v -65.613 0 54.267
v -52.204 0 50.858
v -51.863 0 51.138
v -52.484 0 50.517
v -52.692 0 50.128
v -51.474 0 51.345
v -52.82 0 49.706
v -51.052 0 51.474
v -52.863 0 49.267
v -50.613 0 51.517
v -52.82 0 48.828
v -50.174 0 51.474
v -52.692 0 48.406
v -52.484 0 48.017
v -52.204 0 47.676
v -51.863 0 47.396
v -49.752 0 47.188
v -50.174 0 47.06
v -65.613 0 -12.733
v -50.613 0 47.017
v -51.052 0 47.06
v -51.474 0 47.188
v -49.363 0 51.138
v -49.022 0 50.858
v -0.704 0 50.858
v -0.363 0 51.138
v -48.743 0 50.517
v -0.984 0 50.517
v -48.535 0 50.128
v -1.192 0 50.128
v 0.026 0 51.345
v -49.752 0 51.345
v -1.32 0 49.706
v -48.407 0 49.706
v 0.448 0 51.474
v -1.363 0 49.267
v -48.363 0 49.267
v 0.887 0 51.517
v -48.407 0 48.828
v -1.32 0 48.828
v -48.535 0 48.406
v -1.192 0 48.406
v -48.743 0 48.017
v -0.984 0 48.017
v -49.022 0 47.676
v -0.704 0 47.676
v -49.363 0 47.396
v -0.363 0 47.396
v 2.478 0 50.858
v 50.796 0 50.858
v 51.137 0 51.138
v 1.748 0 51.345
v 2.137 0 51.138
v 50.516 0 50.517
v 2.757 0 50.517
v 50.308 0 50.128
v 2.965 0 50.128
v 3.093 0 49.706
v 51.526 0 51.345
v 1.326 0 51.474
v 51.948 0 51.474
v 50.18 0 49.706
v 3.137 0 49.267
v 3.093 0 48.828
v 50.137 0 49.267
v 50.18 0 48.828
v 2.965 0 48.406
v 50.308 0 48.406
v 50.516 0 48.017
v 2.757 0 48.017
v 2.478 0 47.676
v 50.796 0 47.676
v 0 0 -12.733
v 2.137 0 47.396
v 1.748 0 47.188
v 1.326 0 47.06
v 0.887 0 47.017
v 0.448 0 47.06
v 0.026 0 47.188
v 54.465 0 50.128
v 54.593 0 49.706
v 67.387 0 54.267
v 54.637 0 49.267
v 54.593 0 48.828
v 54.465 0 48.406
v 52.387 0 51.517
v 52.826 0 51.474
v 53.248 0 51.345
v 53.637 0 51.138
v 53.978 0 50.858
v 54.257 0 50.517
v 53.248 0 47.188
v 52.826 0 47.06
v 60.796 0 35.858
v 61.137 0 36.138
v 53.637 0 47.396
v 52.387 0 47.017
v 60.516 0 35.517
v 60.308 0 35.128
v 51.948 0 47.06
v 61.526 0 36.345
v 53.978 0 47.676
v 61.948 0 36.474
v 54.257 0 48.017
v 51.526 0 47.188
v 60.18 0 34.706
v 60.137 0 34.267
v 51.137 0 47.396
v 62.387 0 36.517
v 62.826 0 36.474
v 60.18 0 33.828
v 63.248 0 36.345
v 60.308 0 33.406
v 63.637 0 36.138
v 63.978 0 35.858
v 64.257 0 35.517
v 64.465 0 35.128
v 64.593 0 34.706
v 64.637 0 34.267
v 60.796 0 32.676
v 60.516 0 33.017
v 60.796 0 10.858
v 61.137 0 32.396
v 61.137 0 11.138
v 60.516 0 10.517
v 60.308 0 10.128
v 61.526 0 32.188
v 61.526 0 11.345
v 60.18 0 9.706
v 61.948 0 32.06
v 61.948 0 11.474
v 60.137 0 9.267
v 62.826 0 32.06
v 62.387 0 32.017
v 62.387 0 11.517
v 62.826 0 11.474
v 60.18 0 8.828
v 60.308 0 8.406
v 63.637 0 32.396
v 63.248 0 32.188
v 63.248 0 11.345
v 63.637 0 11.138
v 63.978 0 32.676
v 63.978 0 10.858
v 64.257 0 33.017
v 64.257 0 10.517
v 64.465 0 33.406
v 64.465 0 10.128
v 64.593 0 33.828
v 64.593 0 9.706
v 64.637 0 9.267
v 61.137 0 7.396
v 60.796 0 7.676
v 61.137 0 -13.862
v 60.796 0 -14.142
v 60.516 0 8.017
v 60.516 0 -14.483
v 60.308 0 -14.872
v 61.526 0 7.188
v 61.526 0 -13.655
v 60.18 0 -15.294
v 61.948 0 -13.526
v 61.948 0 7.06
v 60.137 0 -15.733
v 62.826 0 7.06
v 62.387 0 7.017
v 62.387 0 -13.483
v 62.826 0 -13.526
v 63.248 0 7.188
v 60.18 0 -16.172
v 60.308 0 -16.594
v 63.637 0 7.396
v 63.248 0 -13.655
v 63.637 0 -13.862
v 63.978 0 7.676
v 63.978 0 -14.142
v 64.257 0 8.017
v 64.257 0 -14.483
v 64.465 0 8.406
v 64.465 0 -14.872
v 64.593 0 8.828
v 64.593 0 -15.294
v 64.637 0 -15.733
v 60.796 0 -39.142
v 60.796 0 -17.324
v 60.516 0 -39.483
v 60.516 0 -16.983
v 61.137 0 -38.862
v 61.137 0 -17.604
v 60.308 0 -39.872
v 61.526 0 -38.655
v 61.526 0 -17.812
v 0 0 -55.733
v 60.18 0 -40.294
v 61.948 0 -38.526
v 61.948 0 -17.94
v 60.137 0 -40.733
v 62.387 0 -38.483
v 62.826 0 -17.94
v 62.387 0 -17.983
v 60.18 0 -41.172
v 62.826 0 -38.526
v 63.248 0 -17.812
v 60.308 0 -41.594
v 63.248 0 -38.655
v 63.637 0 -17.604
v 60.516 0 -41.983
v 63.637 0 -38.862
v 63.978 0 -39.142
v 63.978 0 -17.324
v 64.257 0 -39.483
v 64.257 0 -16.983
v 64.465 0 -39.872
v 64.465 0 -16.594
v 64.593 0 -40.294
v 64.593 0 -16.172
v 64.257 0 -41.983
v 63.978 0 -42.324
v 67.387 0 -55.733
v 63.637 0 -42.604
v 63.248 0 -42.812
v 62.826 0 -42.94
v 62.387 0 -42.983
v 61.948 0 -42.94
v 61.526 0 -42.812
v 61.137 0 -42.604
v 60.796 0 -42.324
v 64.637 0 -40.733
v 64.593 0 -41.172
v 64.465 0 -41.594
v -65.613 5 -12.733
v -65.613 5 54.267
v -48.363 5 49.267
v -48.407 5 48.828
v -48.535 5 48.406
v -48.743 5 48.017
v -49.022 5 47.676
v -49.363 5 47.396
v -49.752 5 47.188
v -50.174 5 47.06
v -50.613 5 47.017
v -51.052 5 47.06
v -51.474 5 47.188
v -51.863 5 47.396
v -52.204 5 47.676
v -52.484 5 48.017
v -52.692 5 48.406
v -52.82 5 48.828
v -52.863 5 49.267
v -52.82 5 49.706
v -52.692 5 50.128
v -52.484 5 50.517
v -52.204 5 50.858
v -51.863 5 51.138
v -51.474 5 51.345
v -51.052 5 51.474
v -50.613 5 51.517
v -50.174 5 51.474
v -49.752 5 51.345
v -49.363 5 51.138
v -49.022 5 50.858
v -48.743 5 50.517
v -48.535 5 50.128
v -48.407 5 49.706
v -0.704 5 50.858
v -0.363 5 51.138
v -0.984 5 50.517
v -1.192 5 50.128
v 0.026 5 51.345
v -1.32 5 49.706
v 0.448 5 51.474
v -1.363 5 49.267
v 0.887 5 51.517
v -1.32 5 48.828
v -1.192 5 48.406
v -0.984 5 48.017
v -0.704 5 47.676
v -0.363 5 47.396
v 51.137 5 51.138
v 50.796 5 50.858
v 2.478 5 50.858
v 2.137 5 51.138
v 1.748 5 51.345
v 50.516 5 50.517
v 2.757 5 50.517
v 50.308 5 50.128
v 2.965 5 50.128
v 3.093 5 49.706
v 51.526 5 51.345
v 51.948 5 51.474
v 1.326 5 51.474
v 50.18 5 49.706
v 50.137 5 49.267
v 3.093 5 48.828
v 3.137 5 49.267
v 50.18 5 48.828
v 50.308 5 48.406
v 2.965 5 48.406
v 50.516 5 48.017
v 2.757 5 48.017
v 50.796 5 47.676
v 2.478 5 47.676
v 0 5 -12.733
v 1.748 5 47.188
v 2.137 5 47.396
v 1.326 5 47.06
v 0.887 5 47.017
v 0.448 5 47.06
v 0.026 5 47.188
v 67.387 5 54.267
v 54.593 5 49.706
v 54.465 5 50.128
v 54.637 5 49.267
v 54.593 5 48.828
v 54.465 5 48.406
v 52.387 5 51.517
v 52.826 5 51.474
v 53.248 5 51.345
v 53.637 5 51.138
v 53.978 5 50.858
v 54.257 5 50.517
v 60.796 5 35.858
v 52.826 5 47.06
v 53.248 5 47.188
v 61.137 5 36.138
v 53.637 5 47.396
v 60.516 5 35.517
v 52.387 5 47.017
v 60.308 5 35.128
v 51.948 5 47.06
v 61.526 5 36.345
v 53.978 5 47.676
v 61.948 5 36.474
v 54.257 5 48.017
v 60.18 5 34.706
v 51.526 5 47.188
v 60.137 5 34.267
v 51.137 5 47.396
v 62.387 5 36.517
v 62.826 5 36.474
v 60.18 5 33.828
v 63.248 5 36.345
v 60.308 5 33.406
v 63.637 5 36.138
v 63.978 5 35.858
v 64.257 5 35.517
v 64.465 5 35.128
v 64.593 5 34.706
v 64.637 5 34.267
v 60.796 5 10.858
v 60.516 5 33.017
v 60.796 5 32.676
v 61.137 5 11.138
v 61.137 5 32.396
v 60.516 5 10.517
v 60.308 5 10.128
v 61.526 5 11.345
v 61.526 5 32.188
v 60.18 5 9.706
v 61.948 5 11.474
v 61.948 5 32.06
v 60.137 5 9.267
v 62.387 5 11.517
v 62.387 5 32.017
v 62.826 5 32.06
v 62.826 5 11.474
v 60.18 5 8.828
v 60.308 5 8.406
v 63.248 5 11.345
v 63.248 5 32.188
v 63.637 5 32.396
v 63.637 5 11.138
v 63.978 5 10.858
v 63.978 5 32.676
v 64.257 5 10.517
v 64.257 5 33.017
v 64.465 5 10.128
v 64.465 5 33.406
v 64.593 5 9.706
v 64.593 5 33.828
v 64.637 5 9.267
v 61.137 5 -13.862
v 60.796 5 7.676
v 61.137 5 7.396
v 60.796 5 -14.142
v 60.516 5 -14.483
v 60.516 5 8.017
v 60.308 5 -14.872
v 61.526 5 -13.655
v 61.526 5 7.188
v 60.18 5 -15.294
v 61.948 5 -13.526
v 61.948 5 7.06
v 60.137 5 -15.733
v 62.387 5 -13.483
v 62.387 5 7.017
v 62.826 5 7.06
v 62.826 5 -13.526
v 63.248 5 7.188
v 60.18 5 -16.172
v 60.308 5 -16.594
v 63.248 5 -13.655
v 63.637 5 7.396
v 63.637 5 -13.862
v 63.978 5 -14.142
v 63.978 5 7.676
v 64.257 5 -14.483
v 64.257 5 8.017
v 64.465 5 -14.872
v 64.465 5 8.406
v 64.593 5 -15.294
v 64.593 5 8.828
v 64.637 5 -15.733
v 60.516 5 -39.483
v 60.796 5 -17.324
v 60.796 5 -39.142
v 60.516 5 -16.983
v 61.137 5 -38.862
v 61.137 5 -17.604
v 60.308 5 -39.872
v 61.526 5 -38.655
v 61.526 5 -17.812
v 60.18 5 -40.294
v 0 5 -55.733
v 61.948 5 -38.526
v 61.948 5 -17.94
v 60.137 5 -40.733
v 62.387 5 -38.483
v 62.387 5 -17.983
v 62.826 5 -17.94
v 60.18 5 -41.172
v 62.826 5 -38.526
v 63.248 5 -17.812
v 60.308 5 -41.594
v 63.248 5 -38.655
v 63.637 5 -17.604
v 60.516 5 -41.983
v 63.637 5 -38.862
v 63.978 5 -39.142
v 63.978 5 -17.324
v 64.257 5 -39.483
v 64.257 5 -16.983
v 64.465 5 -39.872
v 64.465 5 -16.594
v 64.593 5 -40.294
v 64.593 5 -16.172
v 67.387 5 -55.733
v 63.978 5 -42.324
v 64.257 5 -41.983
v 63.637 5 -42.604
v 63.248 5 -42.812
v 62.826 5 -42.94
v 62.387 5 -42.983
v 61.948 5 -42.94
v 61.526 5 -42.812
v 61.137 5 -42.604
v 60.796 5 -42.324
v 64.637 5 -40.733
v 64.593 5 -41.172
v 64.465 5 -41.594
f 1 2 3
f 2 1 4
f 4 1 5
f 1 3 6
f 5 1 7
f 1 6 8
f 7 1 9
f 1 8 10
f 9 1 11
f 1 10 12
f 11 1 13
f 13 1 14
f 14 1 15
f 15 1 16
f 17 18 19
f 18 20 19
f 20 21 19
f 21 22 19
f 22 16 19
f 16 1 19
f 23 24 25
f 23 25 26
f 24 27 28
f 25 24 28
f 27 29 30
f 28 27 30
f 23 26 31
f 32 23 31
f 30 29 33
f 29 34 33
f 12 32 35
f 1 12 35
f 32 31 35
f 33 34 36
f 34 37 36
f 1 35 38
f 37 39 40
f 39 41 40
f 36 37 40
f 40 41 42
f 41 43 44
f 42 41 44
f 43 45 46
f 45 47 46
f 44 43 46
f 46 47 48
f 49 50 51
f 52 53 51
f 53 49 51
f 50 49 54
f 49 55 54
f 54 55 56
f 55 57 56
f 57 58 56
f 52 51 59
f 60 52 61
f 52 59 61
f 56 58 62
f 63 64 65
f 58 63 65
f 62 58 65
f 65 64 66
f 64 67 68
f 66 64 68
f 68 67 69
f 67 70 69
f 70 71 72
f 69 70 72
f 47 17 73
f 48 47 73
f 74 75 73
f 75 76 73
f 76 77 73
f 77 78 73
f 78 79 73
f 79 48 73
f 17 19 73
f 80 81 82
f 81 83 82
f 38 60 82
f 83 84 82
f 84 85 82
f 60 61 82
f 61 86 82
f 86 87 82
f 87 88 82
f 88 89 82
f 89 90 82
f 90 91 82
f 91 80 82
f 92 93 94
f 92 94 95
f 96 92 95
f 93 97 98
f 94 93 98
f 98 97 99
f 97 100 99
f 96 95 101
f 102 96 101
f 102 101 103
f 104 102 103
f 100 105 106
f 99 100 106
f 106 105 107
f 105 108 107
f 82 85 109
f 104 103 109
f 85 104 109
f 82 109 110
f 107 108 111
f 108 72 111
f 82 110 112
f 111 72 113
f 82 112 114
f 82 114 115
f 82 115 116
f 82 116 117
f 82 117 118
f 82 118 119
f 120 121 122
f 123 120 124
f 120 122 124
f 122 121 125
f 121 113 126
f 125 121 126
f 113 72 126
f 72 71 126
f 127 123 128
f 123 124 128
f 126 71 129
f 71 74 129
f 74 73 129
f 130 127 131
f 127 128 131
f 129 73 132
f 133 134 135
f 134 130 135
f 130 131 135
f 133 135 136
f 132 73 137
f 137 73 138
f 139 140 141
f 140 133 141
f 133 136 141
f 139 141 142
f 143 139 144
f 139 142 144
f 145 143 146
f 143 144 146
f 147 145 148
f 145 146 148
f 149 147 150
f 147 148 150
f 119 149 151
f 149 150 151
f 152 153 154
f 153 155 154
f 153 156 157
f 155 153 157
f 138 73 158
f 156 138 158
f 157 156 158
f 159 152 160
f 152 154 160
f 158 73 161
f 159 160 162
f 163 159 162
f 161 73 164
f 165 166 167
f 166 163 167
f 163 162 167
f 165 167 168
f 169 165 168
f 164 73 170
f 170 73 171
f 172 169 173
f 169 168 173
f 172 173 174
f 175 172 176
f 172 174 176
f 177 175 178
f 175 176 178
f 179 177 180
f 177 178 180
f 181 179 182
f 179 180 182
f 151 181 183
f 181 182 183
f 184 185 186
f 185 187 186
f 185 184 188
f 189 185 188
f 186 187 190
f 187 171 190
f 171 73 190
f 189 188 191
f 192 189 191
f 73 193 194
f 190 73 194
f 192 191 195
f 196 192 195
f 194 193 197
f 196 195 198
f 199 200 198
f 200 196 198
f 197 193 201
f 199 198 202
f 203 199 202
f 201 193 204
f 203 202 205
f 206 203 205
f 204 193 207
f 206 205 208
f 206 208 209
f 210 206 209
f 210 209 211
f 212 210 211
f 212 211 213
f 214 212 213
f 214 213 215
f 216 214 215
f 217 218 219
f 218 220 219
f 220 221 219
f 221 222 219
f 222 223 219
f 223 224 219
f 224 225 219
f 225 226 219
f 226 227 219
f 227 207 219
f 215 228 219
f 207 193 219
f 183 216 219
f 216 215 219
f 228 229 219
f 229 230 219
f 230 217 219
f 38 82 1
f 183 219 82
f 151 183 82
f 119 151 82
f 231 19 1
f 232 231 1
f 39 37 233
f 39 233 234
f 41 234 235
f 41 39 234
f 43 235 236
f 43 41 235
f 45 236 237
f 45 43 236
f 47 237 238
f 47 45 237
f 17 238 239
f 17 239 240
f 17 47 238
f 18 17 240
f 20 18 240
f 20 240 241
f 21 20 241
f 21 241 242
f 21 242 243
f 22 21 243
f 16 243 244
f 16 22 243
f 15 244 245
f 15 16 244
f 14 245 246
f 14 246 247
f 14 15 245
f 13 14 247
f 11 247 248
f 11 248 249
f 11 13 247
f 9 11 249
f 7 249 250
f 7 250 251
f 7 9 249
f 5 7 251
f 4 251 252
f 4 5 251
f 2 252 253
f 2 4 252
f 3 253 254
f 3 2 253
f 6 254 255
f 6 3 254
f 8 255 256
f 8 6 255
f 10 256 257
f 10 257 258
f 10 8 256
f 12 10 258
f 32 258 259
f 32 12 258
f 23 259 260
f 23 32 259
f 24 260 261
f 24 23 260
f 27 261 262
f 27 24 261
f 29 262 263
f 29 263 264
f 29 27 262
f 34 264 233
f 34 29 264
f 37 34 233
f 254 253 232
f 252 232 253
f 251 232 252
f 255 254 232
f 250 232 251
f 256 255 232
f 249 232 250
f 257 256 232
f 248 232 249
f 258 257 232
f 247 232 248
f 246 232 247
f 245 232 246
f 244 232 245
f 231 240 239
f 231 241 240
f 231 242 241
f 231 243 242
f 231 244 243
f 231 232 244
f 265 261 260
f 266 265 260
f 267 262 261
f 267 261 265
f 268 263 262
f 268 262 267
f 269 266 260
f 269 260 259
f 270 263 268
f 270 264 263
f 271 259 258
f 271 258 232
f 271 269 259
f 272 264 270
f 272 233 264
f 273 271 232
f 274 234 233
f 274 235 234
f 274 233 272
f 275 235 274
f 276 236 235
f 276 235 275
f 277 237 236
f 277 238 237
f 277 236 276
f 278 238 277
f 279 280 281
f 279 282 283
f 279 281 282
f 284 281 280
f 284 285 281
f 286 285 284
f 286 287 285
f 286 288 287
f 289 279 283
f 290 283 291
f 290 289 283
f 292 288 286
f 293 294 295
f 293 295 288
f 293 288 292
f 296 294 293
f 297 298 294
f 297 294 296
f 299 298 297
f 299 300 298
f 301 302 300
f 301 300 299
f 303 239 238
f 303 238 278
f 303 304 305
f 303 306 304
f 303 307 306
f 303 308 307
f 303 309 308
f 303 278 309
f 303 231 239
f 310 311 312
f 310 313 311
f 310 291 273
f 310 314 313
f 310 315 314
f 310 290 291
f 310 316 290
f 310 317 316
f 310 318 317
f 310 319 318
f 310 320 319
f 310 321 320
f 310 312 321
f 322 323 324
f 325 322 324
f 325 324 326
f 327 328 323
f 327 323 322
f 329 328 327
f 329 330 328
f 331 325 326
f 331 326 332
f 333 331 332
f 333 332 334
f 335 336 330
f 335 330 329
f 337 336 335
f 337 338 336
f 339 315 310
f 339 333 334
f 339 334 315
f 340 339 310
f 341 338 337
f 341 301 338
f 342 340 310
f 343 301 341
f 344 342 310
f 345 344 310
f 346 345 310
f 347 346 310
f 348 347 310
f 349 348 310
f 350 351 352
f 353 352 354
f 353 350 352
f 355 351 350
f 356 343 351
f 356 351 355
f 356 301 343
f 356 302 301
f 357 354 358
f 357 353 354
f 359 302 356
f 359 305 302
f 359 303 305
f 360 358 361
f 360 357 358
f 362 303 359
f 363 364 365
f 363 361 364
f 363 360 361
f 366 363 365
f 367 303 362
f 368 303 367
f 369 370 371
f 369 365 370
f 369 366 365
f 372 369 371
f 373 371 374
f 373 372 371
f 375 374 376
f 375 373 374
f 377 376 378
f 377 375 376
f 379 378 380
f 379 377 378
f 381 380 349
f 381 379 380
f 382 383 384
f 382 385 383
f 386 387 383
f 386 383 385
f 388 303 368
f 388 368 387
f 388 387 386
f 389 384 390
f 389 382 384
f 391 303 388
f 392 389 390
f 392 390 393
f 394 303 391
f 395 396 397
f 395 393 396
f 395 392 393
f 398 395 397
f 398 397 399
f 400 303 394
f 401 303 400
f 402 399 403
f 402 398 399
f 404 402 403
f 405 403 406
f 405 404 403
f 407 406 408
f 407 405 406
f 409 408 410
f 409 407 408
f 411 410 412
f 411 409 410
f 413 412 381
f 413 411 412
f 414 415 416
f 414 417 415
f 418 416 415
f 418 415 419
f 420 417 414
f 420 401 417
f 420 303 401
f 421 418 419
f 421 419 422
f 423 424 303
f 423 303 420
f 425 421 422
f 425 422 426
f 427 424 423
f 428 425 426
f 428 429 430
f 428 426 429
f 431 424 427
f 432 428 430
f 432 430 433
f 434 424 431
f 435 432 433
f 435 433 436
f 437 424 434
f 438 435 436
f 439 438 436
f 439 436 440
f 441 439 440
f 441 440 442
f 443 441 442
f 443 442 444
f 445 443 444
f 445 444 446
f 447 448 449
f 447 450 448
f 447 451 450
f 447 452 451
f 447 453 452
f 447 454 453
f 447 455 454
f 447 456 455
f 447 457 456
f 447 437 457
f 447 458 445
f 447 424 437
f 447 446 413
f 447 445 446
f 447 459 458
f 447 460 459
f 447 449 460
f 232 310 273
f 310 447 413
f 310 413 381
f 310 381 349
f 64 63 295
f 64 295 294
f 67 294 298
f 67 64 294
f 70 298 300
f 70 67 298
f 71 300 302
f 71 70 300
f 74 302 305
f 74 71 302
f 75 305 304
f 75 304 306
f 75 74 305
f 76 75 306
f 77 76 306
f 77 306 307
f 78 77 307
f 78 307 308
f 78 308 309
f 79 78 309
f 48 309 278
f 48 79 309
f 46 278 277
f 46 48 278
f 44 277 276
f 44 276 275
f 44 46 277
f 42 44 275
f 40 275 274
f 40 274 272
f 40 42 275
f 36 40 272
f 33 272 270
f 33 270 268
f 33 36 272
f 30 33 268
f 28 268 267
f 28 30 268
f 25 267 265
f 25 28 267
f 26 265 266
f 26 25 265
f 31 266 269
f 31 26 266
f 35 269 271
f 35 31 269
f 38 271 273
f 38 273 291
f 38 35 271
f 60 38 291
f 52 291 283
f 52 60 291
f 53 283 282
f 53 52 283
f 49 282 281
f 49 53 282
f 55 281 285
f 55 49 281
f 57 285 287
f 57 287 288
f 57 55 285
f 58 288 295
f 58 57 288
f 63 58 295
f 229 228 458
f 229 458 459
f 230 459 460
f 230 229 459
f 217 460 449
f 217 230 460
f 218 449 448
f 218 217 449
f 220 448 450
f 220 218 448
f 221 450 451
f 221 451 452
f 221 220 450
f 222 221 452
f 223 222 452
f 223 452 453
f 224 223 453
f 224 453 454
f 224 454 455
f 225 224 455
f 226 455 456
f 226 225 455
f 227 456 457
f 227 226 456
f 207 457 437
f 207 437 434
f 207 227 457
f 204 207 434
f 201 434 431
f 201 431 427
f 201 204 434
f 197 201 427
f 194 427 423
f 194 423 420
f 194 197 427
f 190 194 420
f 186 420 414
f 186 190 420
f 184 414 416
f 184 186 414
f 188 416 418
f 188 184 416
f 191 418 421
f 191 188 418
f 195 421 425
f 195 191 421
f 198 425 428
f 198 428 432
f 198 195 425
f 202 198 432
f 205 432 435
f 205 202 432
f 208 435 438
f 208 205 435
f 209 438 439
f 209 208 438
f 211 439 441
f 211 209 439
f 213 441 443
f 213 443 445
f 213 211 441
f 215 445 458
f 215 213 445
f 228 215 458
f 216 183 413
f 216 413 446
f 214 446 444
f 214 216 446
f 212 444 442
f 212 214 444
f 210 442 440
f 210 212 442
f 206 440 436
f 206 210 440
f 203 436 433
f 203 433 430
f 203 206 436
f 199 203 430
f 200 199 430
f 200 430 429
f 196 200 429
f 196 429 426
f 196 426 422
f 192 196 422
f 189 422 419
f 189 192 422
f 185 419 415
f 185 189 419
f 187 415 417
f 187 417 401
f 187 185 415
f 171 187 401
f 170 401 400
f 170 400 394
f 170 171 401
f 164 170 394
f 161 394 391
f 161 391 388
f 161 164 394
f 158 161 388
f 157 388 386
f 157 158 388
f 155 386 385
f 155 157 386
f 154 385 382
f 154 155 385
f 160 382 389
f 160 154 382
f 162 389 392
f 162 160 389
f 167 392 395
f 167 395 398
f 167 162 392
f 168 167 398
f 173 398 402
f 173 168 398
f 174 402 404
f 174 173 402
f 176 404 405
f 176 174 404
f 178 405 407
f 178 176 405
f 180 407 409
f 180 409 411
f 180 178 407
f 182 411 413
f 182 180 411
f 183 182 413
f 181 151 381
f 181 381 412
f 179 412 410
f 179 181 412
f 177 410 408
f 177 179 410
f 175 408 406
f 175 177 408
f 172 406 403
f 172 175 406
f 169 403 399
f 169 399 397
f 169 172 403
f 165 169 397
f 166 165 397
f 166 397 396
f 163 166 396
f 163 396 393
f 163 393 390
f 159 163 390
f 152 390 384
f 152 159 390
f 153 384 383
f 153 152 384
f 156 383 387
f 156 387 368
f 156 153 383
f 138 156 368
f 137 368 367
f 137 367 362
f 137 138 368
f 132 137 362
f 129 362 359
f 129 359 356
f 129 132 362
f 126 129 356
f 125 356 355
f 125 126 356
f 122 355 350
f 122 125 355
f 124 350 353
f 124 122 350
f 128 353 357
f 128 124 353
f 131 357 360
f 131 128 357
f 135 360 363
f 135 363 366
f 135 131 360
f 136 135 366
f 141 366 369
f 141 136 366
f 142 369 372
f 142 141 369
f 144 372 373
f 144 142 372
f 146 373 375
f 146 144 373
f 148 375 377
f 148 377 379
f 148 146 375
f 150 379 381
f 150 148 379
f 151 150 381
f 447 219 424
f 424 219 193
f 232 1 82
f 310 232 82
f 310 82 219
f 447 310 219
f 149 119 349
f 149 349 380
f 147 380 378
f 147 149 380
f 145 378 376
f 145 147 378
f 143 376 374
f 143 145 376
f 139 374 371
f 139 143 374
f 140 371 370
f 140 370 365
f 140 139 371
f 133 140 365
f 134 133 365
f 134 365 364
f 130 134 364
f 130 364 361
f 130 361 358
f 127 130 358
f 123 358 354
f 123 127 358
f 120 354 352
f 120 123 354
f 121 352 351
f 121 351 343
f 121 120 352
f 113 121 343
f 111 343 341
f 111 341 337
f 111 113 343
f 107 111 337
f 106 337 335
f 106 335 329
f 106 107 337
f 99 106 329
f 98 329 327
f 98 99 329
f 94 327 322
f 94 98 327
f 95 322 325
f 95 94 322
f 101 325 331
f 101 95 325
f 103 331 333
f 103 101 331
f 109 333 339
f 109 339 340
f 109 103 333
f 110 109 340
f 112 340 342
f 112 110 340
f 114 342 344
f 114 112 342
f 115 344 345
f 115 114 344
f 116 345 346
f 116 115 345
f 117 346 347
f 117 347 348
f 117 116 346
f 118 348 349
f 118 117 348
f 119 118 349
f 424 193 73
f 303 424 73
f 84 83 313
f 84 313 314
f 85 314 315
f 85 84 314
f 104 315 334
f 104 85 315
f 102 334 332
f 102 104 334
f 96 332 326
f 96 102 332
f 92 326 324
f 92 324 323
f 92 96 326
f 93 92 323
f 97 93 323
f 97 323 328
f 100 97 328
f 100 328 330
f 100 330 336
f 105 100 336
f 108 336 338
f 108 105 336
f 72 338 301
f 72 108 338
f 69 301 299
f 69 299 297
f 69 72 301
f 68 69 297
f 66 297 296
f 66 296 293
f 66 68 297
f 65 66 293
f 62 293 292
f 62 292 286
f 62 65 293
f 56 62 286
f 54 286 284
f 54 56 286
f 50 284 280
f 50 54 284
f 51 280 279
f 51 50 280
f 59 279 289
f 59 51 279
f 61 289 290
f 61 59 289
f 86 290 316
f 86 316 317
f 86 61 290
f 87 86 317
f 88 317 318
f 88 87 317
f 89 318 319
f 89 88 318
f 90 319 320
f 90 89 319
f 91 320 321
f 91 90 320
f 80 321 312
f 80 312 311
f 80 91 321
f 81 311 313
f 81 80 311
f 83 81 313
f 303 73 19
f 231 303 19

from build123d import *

# Parameters (mm, degrees)
SKETCH1_R           = 2.25
BOSS_EXTRUDE1_DEPTH = 5


with BuildPart() as part:
    # Sketch1 → Boss-Extrude1 (new body)
    with BuildSketch(Plane(origin=(0, 0, 0), x_dir=(1, 0, 0), z_dir=(0, 1, 0))):
        Polygon((0, 55.733260811), (0, 12.733260811), (-65.613421019, 12.733260811), (-65.613421019, -54.266739189), (67.386578981, -54.266739189), (67.386578981, 55.733260811), align=None)
        with Locations((62.386578981, 40.733260811)):
            Circle(SKETCH1_R, mode=Mode.SUBTRACT)
        with Locations((62.386578981, 15.733260811)):
            Circle(SKETCH1_R, mode=Mode.SUBTRACT)
        with Locations((62.386578981, -9.266739189)):
            Circle(SKETCH1_R, mode=Mode.SUBTRACT)
        with Locations((62.386578981, -34.266739189)):
            Circle(SKETCH1_R, mode=Mode.SUBTRACT)
        with Locations((0.886578981, -49.266739189)):
            Circle(SKETCH1_R, mode=Mode.SUBTRACT)
        with Locations((-50.613421019, -49.266739189)):
            Circle(SKETCH1_R, mode=Mode.SUBTRACT)
        with Locations((52.386578981, -49.266739189)):
            Circle(SKETCH1_R, mode=Mode.SUBTRACT)
    extrude(amount=BOSS_EXTRUDE1_DEPTH)


solid = part.part
